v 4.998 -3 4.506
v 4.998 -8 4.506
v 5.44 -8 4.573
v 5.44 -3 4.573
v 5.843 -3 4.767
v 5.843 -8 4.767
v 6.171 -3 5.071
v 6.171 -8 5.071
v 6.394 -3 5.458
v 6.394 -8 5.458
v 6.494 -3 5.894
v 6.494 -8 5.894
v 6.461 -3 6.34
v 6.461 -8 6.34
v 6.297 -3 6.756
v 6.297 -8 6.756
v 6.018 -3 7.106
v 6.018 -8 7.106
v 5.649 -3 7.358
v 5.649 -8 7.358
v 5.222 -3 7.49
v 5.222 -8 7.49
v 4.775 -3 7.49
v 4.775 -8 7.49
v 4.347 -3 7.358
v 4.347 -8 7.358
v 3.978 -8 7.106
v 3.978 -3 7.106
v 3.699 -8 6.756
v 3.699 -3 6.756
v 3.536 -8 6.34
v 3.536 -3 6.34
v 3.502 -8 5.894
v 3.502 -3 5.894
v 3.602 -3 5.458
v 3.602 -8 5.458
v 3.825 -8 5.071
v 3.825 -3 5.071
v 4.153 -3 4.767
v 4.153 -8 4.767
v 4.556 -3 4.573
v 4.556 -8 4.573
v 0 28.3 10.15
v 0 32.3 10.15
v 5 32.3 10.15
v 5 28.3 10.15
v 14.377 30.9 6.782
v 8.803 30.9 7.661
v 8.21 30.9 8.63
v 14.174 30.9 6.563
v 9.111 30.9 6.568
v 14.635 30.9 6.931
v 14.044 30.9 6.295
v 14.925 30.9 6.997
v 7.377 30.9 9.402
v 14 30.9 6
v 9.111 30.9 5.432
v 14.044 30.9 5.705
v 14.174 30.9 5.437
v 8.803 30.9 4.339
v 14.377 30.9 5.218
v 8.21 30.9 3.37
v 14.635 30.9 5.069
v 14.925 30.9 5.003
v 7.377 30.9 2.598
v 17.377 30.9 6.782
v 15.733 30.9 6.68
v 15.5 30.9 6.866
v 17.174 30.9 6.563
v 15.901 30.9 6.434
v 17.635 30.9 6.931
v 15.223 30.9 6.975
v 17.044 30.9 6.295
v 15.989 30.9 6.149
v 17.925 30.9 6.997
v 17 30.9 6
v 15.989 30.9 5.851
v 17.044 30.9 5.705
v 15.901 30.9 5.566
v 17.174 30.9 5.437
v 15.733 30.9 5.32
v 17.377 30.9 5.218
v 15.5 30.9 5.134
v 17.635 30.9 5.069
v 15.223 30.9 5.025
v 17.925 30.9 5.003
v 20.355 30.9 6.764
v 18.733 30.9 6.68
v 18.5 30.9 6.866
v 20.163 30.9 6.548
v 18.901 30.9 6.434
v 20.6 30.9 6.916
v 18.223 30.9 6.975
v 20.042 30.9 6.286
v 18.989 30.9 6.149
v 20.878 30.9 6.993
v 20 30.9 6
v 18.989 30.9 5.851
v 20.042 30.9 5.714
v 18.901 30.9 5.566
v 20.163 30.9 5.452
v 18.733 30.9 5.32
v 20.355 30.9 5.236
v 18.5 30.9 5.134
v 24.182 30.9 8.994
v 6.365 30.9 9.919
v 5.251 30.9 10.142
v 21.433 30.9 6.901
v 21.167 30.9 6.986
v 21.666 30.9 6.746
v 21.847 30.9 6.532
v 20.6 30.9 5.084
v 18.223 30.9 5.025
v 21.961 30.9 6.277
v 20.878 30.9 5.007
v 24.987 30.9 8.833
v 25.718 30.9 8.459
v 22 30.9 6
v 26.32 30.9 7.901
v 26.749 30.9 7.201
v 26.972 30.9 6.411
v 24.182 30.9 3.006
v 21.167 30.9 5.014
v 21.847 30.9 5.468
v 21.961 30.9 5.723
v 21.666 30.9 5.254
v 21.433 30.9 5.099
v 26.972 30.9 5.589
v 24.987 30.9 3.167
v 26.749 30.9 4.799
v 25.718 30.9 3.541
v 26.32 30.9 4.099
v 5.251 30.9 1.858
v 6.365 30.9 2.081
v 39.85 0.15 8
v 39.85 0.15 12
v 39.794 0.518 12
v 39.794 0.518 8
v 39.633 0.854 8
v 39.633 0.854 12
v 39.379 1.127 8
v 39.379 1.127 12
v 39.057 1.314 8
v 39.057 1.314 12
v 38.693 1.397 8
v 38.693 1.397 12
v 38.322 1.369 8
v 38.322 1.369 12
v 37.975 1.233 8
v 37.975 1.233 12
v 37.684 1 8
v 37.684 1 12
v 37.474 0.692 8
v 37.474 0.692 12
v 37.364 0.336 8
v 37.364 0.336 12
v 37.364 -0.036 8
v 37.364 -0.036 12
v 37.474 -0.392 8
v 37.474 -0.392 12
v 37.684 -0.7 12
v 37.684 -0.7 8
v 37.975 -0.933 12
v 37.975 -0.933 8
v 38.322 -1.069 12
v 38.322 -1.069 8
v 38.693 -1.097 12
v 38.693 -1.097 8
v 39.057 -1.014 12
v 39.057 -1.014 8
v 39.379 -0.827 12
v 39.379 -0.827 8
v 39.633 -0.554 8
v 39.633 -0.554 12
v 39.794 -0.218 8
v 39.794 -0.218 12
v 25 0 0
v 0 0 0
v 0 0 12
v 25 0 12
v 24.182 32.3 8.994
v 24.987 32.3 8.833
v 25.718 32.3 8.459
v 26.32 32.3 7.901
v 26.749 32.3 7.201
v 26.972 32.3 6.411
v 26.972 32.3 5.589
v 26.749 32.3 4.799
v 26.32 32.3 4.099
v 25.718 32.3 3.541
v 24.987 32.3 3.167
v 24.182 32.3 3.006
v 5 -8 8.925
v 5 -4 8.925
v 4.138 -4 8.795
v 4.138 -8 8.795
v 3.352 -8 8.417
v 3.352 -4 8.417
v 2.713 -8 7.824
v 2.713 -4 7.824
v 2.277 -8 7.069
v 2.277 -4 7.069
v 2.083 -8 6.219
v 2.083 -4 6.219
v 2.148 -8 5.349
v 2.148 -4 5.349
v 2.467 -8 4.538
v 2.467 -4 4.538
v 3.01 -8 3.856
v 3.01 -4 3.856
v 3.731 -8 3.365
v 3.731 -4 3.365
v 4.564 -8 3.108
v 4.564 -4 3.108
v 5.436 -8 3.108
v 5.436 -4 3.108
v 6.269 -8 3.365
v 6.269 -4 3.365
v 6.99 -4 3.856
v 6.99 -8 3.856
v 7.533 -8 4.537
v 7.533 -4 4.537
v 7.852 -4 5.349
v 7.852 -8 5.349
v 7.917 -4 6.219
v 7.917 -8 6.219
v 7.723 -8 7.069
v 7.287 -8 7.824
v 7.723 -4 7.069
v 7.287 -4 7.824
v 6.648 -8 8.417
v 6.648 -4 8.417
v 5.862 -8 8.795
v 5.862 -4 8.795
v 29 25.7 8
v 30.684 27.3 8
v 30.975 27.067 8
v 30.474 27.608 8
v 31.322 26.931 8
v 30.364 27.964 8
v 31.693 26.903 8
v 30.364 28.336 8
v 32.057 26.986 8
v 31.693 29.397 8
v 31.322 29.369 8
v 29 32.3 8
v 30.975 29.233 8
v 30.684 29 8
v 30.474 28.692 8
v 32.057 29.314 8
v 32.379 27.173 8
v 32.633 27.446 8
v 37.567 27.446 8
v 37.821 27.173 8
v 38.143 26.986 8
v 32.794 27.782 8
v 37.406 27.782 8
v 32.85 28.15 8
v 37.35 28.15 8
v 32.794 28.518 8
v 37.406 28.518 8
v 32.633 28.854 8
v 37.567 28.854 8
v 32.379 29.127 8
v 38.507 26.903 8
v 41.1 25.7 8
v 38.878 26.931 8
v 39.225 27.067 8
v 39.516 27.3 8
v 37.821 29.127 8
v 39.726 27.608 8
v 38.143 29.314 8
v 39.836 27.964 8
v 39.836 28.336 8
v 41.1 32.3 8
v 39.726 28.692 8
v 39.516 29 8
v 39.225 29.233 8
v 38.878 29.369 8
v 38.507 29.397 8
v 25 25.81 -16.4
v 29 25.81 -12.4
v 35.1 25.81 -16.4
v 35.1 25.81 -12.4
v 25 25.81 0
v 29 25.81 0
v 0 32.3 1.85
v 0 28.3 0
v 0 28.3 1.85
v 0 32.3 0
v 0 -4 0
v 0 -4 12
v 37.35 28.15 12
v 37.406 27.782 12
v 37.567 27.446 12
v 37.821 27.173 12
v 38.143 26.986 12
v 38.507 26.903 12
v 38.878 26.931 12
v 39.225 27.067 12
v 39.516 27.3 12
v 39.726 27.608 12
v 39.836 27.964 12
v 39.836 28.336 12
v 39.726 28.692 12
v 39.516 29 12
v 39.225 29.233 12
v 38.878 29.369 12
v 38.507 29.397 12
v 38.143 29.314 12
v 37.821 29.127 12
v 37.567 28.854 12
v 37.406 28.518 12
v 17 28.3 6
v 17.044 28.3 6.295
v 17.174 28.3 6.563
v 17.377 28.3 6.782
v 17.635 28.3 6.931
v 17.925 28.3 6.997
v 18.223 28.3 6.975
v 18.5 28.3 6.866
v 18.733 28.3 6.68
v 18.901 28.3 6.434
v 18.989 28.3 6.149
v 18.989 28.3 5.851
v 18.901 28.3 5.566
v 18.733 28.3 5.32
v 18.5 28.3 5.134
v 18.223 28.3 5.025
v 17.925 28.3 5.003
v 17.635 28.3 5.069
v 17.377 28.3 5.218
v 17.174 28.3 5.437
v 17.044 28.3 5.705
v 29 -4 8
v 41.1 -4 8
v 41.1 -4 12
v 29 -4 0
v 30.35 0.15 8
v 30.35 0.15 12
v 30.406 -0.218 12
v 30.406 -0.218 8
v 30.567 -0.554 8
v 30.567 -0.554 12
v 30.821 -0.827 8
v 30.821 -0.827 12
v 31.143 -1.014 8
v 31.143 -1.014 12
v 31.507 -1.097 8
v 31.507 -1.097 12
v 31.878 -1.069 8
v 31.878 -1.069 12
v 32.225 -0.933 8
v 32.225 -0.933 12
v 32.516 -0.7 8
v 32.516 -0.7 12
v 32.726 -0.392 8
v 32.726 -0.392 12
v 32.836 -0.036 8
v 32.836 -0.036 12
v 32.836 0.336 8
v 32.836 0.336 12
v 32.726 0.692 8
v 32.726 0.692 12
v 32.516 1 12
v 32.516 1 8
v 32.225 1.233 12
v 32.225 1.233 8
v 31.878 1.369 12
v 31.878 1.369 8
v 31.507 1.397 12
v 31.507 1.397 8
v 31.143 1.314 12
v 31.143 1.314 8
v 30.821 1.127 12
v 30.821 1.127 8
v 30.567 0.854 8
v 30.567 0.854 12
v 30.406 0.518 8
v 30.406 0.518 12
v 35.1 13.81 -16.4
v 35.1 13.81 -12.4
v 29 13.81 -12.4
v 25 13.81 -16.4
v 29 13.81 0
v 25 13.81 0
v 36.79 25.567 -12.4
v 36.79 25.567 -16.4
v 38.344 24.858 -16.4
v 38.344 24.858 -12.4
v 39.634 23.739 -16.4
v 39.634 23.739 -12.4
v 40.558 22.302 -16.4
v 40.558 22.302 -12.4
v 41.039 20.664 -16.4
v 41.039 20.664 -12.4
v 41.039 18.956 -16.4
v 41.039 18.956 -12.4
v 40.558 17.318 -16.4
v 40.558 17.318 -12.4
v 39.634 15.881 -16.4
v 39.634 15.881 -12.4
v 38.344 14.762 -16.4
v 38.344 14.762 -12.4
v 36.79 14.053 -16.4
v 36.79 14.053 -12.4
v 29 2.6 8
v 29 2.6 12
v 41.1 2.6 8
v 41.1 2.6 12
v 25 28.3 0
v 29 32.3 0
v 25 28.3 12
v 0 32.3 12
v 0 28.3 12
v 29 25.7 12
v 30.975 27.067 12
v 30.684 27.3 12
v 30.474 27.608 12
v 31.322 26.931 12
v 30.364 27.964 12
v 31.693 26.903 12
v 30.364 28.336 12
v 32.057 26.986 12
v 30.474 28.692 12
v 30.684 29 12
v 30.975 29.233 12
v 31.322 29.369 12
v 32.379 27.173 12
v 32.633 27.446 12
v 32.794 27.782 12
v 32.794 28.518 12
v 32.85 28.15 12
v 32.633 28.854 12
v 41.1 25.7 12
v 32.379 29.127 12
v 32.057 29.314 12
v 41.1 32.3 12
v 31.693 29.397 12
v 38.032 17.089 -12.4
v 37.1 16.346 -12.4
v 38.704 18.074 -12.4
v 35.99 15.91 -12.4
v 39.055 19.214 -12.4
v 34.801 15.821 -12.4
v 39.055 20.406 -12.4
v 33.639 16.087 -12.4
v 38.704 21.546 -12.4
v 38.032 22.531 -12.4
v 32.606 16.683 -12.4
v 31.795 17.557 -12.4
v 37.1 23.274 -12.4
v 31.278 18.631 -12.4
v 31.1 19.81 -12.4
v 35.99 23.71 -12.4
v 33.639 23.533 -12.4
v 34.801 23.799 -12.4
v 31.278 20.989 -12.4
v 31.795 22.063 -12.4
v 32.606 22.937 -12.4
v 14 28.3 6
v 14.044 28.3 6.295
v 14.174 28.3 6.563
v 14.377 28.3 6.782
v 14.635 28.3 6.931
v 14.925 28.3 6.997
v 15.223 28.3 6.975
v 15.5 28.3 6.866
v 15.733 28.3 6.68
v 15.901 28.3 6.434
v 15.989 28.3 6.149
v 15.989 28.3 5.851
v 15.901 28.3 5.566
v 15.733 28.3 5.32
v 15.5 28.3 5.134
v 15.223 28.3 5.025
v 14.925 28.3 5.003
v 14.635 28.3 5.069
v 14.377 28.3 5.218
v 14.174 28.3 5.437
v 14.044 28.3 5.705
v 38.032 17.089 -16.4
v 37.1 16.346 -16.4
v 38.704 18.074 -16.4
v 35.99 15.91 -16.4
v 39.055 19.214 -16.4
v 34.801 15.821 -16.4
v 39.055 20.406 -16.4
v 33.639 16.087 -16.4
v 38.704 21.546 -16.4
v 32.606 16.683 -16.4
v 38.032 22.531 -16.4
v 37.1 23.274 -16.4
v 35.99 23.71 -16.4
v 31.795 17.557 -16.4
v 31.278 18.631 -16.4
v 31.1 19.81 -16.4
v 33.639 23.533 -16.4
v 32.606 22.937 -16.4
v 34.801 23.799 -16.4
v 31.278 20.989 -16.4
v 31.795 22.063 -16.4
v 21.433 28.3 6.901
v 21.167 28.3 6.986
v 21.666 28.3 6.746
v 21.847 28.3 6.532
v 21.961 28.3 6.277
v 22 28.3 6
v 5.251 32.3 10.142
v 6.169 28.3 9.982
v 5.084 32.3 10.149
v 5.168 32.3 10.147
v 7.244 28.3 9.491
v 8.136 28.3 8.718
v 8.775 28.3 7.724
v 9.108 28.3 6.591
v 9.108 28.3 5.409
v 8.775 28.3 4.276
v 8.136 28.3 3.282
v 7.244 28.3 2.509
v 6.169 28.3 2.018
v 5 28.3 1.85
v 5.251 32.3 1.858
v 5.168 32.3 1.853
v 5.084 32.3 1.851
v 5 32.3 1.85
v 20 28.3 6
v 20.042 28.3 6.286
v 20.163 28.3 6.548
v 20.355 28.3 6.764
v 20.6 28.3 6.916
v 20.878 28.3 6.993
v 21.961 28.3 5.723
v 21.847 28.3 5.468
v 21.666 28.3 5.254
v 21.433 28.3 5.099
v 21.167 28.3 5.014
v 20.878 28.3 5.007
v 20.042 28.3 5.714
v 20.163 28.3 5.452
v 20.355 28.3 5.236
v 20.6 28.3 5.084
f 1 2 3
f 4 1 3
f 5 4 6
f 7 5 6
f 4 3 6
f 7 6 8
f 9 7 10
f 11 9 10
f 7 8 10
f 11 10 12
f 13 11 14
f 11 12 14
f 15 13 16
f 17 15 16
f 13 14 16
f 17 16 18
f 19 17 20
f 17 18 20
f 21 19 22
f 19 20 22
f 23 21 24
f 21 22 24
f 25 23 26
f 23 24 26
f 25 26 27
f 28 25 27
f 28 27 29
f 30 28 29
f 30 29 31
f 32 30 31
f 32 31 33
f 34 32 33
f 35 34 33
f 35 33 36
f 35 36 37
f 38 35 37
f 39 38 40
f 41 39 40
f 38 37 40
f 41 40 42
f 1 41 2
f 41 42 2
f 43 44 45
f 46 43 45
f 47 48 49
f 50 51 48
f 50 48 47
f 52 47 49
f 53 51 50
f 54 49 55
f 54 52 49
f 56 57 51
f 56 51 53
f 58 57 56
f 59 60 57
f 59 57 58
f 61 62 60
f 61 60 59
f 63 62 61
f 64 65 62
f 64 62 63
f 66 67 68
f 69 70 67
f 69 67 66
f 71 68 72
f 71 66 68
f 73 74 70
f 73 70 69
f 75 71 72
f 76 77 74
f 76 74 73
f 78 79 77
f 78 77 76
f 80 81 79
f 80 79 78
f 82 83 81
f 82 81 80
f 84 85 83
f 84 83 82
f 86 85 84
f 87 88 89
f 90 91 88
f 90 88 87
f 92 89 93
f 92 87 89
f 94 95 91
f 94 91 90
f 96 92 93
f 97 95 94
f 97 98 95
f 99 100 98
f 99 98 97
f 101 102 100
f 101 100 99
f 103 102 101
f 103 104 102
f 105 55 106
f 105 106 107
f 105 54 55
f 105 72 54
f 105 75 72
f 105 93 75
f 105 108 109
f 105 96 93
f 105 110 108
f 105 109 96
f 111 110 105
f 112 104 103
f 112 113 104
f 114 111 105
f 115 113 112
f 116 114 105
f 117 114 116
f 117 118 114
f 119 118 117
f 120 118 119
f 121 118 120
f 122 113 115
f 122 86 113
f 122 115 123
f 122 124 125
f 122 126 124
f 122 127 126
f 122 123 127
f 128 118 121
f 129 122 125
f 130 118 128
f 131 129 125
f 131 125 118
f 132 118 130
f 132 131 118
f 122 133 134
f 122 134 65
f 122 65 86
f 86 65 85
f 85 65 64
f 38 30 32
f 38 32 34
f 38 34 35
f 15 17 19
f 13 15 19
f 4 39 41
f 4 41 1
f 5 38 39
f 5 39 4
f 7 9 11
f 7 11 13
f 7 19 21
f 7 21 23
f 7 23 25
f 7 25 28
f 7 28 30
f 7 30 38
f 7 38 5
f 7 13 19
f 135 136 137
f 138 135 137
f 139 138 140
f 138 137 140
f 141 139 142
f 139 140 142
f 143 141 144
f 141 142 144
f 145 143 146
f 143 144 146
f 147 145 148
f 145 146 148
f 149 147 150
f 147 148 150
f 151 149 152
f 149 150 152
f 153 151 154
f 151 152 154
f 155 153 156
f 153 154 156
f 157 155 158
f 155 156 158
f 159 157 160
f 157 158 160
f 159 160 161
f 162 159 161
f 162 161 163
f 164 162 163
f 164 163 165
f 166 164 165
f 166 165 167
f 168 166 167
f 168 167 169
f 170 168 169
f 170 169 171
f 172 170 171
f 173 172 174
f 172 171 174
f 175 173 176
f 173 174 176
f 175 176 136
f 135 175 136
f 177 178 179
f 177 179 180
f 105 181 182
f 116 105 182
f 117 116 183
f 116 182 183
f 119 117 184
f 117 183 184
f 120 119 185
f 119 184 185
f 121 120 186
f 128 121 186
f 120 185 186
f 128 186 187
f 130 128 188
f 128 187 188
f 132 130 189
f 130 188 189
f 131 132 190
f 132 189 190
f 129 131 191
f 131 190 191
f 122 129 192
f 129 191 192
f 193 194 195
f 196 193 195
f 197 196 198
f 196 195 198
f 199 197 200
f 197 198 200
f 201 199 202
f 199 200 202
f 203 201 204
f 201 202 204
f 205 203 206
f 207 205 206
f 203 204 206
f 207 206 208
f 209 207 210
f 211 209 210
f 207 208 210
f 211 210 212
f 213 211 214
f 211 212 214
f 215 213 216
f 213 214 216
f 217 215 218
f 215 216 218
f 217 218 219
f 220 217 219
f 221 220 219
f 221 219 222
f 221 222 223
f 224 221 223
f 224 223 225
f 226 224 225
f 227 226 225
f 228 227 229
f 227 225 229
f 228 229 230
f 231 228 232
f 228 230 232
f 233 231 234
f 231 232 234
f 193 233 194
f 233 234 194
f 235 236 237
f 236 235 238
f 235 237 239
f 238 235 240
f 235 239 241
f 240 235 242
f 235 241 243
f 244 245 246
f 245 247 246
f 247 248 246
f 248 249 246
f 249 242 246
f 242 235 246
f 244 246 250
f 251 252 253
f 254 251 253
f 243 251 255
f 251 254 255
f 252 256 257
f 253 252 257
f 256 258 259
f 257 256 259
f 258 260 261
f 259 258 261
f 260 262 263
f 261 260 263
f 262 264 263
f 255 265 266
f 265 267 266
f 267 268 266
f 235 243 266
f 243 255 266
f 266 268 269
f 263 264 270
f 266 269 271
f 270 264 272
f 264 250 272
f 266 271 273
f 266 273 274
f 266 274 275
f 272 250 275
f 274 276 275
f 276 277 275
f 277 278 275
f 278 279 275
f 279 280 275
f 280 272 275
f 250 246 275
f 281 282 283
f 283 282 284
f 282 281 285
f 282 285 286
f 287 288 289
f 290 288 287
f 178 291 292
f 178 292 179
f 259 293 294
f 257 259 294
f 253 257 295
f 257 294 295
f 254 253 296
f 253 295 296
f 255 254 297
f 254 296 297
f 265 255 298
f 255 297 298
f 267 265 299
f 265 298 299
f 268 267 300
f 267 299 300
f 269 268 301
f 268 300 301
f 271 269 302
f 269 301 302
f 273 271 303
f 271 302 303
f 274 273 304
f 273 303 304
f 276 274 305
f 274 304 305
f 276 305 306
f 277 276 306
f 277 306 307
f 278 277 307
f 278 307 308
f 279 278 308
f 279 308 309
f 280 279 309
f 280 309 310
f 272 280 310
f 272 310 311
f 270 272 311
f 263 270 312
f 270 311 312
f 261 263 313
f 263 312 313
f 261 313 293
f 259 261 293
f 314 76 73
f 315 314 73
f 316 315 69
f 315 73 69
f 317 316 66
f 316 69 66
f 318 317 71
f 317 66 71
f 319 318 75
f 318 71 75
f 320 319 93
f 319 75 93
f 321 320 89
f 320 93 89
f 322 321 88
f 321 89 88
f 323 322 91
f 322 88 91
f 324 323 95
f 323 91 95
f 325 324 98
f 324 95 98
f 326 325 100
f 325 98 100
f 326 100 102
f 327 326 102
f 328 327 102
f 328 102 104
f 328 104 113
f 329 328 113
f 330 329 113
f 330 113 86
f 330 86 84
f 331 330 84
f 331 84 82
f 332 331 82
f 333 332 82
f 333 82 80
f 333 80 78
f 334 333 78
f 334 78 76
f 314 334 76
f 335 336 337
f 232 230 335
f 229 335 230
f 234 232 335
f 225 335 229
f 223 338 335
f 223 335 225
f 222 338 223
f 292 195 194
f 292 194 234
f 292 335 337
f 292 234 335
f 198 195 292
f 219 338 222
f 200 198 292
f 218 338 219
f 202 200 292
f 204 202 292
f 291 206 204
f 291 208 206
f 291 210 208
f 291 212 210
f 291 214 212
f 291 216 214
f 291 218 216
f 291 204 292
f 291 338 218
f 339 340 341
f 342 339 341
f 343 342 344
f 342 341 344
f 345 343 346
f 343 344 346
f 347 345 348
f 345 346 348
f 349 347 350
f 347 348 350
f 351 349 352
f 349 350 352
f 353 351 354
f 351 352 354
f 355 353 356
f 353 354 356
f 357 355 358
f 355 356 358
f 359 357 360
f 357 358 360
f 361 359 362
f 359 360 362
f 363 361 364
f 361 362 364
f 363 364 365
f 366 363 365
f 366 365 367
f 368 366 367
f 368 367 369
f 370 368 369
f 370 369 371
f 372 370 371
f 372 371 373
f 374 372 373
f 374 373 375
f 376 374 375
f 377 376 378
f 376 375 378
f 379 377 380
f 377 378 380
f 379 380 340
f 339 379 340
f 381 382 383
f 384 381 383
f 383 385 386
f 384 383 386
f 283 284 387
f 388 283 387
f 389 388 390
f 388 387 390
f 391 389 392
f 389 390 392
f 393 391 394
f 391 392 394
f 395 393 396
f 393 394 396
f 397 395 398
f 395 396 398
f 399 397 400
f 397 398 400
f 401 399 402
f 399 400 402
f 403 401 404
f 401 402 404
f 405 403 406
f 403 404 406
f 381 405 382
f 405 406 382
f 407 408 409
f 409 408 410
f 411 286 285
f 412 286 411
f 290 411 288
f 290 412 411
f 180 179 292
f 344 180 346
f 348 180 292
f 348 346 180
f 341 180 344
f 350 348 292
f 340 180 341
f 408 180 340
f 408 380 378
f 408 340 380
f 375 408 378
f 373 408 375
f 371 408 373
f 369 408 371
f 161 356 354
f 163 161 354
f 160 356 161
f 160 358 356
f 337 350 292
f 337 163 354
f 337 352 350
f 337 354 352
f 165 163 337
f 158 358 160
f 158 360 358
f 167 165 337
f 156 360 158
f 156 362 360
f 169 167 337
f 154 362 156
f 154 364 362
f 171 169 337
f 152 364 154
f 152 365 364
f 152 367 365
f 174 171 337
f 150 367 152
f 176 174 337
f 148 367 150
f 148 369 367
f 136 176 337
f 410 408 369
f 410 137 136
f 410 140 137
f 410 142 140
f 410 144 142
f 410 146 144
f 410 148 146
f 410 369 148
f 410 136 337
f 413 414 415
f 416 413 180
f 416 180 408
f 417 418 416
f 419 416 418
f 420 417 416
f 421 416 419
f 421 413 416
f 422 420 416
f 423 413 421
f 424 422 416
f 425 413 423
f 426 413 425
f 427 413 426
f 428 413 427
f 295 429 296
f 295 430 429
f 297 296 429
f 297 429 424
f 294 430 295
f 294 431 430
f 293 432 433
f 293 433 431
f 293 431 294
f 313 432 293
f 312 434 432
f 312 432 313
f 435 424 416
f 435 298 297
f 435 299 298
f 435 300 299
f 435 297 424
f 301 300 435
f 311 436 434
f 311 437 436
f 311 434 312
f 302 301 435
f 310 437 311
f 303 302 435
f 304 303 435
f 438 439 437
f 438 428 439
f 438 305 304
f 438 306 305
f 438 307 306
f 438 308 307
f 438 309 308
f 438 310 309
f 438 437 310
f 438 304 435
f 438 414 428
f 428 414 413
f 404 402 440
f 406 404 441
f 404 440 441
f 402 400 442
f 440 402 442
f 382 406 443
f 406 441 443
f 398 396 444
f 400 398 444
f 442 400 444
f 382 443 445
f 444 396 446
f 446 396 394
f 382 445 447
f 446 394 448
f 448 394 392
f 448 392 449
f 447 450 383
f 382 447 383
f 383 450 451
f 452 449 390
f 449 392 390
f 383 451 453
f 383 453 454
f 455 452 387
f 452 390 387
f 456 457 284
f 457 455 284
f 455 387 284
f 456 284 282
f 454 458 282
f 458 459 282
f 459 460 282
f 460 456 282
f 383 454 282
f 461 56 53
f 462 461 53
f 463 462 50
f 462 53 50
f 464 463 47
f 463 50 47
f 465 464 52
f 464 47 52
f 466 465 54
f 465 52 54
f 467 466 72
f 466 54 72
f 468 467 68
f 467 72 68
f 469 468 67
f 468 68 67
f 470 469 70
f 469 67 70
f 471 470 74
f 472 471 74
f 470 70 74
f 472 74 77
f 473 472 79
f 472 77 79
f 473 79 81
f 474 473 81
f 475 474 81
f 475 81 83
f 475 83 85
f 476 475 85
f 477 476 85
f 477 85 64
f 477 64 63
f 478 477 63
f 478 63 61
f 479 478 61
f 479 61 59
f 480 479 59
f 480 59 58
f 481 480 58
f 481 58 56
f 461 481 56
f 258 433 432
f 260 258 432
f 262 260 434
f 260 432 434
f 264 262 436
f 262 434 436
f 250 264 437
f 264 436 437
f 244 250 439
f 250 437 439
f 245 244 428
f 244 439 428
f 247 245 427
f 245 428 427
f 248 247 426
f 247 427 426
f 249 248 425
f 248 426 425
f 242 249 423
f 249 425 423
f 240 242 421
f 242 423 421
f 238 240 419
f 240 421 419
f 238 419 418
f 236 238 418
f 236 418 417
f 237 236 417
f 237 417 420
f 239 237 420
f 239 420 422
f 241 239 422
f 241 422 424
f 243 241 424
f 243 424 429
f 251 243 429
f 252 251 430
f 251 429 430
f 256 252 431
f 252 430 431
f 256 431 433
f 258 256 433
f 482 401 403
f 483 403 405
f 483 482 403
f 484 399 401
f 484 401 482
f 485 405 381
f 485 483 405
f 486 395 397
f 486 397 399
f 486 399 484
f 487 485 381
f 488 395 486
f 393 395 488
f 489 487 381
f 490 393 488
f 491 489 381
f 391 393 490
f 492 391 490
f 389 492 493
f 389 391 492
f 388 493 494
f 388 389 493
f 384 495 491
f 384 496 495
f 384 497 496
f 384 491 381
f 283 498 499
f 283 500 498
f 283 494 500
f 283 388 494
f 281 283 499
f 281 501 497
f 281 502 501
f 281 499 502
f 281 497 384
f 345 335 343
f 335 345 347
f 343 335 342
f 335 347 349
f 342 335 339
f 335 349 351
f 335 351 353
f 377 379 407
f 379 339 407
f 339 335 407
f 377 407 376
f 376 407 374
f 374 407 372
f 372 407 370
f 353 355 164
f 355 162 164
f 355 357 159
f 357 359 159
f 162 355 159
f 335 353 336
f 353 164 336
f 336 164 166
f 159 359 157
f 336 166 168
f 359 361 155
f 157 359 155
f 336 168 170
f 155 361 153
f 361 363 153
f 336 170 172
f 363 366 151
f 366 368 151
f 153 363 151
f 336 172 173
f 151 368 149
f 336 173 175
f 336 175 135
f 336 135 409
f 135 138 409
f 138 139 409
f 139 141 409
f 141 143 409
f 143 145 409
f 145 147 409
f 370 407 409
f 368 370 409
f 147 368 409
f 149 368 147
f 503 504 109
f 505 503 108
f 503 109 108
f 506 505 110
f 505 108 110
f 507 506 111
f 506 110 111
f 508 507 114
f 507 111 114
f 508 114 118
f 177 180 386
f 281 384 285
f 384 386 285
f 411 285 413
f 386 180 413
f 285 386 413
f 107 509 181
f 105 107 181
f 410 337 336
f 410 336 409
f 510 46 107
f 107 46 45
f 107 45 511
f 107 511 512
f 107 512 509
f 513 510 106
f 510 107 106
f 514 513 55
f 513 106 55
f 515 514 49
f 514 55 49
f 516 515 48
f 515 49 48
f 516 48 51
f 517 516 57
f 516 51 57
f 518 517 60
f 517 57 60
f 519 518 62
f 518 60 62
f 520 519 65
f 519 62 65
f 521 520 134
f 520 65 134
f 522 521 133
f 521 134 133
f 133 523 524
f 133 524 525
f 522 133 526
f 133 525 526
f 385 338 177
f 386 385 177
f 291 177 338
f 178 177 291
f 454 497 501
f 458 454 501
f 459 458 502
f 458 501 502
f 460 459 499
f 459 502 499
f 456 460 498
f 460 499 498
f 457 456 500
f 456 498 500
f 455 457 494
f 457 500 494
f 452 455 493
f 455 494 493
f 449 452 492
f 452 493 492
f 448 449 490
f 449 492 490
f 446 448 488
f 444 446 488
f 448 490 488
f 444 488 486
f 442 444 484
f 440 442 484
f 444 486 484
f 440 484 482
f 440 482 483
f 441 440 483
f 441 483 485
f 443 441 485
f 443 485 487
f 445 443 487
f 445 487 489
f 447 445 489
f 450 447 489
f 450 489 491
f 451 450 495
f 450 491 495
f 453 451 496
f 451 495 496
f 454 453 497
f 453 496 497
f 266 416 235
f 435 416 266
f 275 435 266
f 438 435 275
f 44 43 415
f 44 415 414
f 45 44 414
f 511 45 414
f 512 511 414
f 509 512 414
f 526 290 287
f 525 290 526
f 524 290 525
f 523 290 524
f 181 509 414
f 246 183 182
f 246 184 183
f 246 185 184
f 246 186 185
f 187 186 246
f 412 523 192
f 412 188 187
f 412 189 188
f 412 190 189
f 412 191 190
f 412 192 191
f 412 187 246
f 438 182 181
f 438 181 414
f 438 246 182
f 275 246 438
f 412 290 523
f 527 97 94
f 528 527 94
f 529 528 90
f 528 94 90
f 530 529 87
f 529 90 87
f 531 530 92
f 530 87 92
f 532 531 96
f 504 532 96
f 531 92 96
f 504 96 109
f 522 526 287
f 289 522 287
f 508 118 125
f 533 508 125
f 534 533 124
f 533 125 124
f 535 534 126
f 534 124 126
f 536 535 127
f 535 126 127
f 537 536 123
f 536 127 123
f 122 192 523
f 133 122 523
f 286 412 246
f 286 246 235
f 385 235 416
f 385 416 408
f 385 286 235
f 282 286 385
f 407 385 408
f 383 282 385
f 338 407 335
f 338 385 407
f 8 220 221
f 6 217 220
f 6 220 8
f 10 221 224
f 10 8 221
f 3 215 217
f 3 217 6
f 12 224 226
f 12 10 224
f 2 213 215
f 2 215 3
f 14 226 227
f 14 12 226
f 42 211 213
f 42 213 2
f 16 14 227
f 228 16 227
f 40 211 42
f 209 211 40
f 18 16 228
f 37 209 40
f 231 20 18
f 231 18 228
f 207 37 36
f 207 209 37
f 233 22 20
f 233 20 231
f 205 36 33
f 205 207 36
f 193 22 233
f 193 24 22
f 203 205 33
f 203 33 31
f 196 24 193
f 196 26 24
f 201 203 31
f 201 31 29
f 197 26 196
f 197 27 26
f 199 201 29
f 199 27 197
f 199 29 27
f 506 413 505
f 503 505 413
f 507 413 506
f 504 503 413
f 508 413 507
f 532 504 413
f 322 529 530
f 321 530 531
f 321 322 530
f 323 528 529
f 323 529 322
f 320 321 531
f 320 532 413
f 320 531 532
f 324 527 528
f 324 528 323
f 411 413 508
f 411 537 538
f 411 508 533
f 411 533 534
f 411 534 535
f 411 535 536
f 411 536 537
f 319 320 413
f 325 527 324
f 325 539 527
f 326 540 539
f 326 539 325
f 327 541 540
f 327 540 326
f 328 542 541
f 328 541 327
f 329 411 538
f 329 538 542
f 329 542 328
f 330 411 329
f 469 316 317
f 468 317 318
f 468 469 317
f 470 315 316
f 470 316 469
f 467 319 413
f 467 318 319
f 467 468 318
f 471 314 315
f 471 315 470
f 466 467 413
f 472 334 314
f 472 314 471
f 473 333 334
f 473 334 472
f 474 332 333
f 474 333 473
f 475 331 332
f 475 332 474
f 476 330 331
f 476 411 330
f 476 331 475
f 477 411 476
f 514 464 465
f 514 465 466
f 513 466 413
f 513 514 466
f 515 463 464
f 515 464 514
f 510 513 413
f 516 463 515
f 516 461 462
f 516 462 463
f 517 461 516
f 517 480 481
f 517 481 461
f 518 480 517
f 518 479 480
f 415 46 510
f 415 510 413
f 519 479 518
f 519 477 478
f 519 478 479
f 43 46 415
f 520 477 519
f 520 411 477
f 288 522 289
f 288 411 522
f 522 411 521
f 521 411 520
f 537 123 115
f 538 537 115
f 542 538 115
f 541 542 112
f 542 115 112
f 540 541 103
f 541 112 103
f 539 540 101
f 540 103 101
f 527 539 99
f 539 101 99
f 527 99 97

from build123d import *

# Parameters (mm, degrees)
EXTRUDE_1_DEPTH     = 12
SKETCH_2_R          = 2.925
EXTRUDE_2_DEPTH     = 4
SKETCH_3_W          = 12.1
SKETCH_3_H          = 6.6
SKETCH_3_R          = 1.25
EXTRUDE_3_DEPTH     = 4
SKETCH_4_W          = 12.4
SKETCH_4_H          = 12
EXTRUDE_4_DEPTH     = 4
EXTRUDE_5_DEPTH     = 4
SKETCH_6_R          = 4
CUT_EXTRUDE_1_DEPTH = 4
CUT_EXTRUDE_2_DEPTH = 4
SKETCH_8_R          = 1
CUT_EXTRUDE_3_DEPTH = 1.4
SKETCH_8_3_R        = 1
CUT_EXTRUDE_4_DEPTH = 4
SKETCH_9_R          = 1.5
CUT_EXTRUDE_5_DEPTH = 5


with BuildPart() as part:
    # 草图1 → 凸台-拉伸1 (new body)
    with BuildSketch(Plane.XY):
        Polygon((0, 0), (25, 0), (25, 28.3), (0, 28.3), (0, 32.3), (29, 32.3), (29, -4), (0, -4), align=None)
    extrude(amount=EXTRUDE_1_DEPTH)

    # 草图2 → 凸台-拉伸2 (add)
    with BuildSketch(Plane.XZ.offset(4)):
        with Locations((5, 6)):
            Circle(SKETCH_2_R)
    extrude(amount=EXTRUDE_2_DEPTH)

    # 草图3 → 凸台-拉伸3 (add)
    # profile 1 of 2: a face of its own
    with BuildSketch(Plane.XY.offset(12)):
        with Locations((35.05, 29)):
            Rectangle(SKETCH_3_W, SKETCH_3_H)
        with Locations((31.6, 28.15)):
            Circle(SKETCH_3_R, mode=Mode.SUBTRACT)
        with Locations((38.6, 28.15)):
            Circle(SKETCH_3_R, mode=Mode.SUBTRACT)
    # profile 2 of 2: a face of its own
    with BuildSketch(Plane.XY.offset(12)):
        with Locations((35.05, -0.7)):
            Rectangle(SKETCH_3_W, SKETCH_3_H)
        with Locations((38.6, 0.15)):
            Circle(SKETCH_3_R, mode=Mode.SUBTRACT)
        with Locations((31.6, 0.15)):
            Circle(SKETCH_3_R, mode=Mode.SUBTRACT)
    extrude(amount=-EXTRUDE_3_DEPTH)

    # 草图4 → 凸台-拉伸4 (add)
    with BuildSketch(Plane(origin=(29, 0, 0), x_dir=(0, 0, -1), z_dir=(1, 0, 0))):
        with Locations((6.2, 19.81)):
            Rectangle(SKETCH_4_W, SKETCH_4_H)
    extrude(amount=-EXTRUDE_4_DEPTH)

    # 草图5 → 凸台-拉伸5 (add)
    with BuildSketch(Plane(origin=(0, 0, -12.4), x_dir=(-1, 0, 0), z_dir=(0, 0, -1))):
        with BuildLine():
            Line((-35.1, 13.81), (-25, 13.81))
            Line((-25, 13.81), (-25, 25.81))
            Line((-25, 25.81), (-35.1, 25.81))
            ThreePointArc((-35.1, 25.81), (-41.1, 19.81), (-35.1, 13.81))
        make_face()
    extrude(amount=EXTRUDE_5_DEPTH)

    # 草图6 → 切除-拉伸1 (cut)
    with BuildSketch(Plane(origin=(0, 0, -16.4), x_dir=(-1, 0, 0), z_dir=(0, 0, -1))):
        with Locations((-35.1, 19.81)):
            Circle(SKETCH_6_R)
    extrude(amount=-CUT_EXTRUDE_1_DEPTH, mode=Mode.SUBTRACT)

    # 草图7 → 切除-拉伸2 (cut)
    with BuildSketch(Plane(origin=(0, 32.3, 0), x_dir=(1, 0, 0), z_dir=(0, 1, 0))):
        with BuildLine():
            Line((0, -1.85), (0, -10.15))
            Line((0, -10.15), (5, -10.15))
            ThreePointArc((5, -10.15), (9.15, -6), (5, -1.85))
            Line((5, -1.85), (0, -1.85))
        make_face()
    extrude(amount=-CUT_EXTRUDE_2_DEPTH, mode=Mode.SUBTRACT)

    # 草图8 → 切除-拉伸3 (cut)
    with BuildSketch(Plane(origin=(0, 32.3, 0), x_dir=(1, 0, 0), z_dir=(0, 1, 0))):
        with BuildLine():
            ThreePointArc((5.251184211, -1.857608602), (9.15, -6), (5.251184211, -10.142391398))
            Line((5.251184211, -10.142391398), (24.181578947, -8.994499806))
            ThreePointArc((24.181578947, -8.994499806), (27, -6), (24.181578947, -3.005500194))
            Line((24.181578947, -3.005500194), (5.251184211, -1.857608602))
        make_face()
        with Locations((21, -6)):
            Circle(SKETCH_8_R, mode=Mode.SUBTRACT)
        with Locations((18, -6)):
            Circle(SKETCH_8_R, mode=Mode.SUBTRACT)
        with Locations((15, -6)):
            Circle(SKETCH_8_R, mode=Mode.SUBTRACT)
    extrude(amount=-CUT_EXTRUDE_3_DEPTH, mode=Mode.SUBTRACT)

    # 草图8<3> → 切除-拉伸4 (cut)
    with BuildSketch(Plane(origin=(0, 32.3, 0), x_dir=(1, 0, 0), z_dir=(0, 1, 0))):
        with Locations((15, -6)):
            Circle(SKETCH_8_3_R)
        with Locations((18, -6)):
            Circle(SKETCH_8_3_R)
        with Locations((21, -6)):
            Circle(SKETCH_8_3_R)
    extrude(amount=-CUT_EXTRUDE_4_DEPTH, mode=Mode.SUBTRACT)

    # 草图9 → 切除-拉伸5 (cut)
    with BuildSketch(Plane.XZ.offset(8)):
        with Locations((4.998125707, 6.006461186)):
            Circle(SKETCH_9_R)
    extrude(amount=-CUT_EXTRUDE_5_DEPTH, mode=Mode.SUBTRACT)


solid = part.part
